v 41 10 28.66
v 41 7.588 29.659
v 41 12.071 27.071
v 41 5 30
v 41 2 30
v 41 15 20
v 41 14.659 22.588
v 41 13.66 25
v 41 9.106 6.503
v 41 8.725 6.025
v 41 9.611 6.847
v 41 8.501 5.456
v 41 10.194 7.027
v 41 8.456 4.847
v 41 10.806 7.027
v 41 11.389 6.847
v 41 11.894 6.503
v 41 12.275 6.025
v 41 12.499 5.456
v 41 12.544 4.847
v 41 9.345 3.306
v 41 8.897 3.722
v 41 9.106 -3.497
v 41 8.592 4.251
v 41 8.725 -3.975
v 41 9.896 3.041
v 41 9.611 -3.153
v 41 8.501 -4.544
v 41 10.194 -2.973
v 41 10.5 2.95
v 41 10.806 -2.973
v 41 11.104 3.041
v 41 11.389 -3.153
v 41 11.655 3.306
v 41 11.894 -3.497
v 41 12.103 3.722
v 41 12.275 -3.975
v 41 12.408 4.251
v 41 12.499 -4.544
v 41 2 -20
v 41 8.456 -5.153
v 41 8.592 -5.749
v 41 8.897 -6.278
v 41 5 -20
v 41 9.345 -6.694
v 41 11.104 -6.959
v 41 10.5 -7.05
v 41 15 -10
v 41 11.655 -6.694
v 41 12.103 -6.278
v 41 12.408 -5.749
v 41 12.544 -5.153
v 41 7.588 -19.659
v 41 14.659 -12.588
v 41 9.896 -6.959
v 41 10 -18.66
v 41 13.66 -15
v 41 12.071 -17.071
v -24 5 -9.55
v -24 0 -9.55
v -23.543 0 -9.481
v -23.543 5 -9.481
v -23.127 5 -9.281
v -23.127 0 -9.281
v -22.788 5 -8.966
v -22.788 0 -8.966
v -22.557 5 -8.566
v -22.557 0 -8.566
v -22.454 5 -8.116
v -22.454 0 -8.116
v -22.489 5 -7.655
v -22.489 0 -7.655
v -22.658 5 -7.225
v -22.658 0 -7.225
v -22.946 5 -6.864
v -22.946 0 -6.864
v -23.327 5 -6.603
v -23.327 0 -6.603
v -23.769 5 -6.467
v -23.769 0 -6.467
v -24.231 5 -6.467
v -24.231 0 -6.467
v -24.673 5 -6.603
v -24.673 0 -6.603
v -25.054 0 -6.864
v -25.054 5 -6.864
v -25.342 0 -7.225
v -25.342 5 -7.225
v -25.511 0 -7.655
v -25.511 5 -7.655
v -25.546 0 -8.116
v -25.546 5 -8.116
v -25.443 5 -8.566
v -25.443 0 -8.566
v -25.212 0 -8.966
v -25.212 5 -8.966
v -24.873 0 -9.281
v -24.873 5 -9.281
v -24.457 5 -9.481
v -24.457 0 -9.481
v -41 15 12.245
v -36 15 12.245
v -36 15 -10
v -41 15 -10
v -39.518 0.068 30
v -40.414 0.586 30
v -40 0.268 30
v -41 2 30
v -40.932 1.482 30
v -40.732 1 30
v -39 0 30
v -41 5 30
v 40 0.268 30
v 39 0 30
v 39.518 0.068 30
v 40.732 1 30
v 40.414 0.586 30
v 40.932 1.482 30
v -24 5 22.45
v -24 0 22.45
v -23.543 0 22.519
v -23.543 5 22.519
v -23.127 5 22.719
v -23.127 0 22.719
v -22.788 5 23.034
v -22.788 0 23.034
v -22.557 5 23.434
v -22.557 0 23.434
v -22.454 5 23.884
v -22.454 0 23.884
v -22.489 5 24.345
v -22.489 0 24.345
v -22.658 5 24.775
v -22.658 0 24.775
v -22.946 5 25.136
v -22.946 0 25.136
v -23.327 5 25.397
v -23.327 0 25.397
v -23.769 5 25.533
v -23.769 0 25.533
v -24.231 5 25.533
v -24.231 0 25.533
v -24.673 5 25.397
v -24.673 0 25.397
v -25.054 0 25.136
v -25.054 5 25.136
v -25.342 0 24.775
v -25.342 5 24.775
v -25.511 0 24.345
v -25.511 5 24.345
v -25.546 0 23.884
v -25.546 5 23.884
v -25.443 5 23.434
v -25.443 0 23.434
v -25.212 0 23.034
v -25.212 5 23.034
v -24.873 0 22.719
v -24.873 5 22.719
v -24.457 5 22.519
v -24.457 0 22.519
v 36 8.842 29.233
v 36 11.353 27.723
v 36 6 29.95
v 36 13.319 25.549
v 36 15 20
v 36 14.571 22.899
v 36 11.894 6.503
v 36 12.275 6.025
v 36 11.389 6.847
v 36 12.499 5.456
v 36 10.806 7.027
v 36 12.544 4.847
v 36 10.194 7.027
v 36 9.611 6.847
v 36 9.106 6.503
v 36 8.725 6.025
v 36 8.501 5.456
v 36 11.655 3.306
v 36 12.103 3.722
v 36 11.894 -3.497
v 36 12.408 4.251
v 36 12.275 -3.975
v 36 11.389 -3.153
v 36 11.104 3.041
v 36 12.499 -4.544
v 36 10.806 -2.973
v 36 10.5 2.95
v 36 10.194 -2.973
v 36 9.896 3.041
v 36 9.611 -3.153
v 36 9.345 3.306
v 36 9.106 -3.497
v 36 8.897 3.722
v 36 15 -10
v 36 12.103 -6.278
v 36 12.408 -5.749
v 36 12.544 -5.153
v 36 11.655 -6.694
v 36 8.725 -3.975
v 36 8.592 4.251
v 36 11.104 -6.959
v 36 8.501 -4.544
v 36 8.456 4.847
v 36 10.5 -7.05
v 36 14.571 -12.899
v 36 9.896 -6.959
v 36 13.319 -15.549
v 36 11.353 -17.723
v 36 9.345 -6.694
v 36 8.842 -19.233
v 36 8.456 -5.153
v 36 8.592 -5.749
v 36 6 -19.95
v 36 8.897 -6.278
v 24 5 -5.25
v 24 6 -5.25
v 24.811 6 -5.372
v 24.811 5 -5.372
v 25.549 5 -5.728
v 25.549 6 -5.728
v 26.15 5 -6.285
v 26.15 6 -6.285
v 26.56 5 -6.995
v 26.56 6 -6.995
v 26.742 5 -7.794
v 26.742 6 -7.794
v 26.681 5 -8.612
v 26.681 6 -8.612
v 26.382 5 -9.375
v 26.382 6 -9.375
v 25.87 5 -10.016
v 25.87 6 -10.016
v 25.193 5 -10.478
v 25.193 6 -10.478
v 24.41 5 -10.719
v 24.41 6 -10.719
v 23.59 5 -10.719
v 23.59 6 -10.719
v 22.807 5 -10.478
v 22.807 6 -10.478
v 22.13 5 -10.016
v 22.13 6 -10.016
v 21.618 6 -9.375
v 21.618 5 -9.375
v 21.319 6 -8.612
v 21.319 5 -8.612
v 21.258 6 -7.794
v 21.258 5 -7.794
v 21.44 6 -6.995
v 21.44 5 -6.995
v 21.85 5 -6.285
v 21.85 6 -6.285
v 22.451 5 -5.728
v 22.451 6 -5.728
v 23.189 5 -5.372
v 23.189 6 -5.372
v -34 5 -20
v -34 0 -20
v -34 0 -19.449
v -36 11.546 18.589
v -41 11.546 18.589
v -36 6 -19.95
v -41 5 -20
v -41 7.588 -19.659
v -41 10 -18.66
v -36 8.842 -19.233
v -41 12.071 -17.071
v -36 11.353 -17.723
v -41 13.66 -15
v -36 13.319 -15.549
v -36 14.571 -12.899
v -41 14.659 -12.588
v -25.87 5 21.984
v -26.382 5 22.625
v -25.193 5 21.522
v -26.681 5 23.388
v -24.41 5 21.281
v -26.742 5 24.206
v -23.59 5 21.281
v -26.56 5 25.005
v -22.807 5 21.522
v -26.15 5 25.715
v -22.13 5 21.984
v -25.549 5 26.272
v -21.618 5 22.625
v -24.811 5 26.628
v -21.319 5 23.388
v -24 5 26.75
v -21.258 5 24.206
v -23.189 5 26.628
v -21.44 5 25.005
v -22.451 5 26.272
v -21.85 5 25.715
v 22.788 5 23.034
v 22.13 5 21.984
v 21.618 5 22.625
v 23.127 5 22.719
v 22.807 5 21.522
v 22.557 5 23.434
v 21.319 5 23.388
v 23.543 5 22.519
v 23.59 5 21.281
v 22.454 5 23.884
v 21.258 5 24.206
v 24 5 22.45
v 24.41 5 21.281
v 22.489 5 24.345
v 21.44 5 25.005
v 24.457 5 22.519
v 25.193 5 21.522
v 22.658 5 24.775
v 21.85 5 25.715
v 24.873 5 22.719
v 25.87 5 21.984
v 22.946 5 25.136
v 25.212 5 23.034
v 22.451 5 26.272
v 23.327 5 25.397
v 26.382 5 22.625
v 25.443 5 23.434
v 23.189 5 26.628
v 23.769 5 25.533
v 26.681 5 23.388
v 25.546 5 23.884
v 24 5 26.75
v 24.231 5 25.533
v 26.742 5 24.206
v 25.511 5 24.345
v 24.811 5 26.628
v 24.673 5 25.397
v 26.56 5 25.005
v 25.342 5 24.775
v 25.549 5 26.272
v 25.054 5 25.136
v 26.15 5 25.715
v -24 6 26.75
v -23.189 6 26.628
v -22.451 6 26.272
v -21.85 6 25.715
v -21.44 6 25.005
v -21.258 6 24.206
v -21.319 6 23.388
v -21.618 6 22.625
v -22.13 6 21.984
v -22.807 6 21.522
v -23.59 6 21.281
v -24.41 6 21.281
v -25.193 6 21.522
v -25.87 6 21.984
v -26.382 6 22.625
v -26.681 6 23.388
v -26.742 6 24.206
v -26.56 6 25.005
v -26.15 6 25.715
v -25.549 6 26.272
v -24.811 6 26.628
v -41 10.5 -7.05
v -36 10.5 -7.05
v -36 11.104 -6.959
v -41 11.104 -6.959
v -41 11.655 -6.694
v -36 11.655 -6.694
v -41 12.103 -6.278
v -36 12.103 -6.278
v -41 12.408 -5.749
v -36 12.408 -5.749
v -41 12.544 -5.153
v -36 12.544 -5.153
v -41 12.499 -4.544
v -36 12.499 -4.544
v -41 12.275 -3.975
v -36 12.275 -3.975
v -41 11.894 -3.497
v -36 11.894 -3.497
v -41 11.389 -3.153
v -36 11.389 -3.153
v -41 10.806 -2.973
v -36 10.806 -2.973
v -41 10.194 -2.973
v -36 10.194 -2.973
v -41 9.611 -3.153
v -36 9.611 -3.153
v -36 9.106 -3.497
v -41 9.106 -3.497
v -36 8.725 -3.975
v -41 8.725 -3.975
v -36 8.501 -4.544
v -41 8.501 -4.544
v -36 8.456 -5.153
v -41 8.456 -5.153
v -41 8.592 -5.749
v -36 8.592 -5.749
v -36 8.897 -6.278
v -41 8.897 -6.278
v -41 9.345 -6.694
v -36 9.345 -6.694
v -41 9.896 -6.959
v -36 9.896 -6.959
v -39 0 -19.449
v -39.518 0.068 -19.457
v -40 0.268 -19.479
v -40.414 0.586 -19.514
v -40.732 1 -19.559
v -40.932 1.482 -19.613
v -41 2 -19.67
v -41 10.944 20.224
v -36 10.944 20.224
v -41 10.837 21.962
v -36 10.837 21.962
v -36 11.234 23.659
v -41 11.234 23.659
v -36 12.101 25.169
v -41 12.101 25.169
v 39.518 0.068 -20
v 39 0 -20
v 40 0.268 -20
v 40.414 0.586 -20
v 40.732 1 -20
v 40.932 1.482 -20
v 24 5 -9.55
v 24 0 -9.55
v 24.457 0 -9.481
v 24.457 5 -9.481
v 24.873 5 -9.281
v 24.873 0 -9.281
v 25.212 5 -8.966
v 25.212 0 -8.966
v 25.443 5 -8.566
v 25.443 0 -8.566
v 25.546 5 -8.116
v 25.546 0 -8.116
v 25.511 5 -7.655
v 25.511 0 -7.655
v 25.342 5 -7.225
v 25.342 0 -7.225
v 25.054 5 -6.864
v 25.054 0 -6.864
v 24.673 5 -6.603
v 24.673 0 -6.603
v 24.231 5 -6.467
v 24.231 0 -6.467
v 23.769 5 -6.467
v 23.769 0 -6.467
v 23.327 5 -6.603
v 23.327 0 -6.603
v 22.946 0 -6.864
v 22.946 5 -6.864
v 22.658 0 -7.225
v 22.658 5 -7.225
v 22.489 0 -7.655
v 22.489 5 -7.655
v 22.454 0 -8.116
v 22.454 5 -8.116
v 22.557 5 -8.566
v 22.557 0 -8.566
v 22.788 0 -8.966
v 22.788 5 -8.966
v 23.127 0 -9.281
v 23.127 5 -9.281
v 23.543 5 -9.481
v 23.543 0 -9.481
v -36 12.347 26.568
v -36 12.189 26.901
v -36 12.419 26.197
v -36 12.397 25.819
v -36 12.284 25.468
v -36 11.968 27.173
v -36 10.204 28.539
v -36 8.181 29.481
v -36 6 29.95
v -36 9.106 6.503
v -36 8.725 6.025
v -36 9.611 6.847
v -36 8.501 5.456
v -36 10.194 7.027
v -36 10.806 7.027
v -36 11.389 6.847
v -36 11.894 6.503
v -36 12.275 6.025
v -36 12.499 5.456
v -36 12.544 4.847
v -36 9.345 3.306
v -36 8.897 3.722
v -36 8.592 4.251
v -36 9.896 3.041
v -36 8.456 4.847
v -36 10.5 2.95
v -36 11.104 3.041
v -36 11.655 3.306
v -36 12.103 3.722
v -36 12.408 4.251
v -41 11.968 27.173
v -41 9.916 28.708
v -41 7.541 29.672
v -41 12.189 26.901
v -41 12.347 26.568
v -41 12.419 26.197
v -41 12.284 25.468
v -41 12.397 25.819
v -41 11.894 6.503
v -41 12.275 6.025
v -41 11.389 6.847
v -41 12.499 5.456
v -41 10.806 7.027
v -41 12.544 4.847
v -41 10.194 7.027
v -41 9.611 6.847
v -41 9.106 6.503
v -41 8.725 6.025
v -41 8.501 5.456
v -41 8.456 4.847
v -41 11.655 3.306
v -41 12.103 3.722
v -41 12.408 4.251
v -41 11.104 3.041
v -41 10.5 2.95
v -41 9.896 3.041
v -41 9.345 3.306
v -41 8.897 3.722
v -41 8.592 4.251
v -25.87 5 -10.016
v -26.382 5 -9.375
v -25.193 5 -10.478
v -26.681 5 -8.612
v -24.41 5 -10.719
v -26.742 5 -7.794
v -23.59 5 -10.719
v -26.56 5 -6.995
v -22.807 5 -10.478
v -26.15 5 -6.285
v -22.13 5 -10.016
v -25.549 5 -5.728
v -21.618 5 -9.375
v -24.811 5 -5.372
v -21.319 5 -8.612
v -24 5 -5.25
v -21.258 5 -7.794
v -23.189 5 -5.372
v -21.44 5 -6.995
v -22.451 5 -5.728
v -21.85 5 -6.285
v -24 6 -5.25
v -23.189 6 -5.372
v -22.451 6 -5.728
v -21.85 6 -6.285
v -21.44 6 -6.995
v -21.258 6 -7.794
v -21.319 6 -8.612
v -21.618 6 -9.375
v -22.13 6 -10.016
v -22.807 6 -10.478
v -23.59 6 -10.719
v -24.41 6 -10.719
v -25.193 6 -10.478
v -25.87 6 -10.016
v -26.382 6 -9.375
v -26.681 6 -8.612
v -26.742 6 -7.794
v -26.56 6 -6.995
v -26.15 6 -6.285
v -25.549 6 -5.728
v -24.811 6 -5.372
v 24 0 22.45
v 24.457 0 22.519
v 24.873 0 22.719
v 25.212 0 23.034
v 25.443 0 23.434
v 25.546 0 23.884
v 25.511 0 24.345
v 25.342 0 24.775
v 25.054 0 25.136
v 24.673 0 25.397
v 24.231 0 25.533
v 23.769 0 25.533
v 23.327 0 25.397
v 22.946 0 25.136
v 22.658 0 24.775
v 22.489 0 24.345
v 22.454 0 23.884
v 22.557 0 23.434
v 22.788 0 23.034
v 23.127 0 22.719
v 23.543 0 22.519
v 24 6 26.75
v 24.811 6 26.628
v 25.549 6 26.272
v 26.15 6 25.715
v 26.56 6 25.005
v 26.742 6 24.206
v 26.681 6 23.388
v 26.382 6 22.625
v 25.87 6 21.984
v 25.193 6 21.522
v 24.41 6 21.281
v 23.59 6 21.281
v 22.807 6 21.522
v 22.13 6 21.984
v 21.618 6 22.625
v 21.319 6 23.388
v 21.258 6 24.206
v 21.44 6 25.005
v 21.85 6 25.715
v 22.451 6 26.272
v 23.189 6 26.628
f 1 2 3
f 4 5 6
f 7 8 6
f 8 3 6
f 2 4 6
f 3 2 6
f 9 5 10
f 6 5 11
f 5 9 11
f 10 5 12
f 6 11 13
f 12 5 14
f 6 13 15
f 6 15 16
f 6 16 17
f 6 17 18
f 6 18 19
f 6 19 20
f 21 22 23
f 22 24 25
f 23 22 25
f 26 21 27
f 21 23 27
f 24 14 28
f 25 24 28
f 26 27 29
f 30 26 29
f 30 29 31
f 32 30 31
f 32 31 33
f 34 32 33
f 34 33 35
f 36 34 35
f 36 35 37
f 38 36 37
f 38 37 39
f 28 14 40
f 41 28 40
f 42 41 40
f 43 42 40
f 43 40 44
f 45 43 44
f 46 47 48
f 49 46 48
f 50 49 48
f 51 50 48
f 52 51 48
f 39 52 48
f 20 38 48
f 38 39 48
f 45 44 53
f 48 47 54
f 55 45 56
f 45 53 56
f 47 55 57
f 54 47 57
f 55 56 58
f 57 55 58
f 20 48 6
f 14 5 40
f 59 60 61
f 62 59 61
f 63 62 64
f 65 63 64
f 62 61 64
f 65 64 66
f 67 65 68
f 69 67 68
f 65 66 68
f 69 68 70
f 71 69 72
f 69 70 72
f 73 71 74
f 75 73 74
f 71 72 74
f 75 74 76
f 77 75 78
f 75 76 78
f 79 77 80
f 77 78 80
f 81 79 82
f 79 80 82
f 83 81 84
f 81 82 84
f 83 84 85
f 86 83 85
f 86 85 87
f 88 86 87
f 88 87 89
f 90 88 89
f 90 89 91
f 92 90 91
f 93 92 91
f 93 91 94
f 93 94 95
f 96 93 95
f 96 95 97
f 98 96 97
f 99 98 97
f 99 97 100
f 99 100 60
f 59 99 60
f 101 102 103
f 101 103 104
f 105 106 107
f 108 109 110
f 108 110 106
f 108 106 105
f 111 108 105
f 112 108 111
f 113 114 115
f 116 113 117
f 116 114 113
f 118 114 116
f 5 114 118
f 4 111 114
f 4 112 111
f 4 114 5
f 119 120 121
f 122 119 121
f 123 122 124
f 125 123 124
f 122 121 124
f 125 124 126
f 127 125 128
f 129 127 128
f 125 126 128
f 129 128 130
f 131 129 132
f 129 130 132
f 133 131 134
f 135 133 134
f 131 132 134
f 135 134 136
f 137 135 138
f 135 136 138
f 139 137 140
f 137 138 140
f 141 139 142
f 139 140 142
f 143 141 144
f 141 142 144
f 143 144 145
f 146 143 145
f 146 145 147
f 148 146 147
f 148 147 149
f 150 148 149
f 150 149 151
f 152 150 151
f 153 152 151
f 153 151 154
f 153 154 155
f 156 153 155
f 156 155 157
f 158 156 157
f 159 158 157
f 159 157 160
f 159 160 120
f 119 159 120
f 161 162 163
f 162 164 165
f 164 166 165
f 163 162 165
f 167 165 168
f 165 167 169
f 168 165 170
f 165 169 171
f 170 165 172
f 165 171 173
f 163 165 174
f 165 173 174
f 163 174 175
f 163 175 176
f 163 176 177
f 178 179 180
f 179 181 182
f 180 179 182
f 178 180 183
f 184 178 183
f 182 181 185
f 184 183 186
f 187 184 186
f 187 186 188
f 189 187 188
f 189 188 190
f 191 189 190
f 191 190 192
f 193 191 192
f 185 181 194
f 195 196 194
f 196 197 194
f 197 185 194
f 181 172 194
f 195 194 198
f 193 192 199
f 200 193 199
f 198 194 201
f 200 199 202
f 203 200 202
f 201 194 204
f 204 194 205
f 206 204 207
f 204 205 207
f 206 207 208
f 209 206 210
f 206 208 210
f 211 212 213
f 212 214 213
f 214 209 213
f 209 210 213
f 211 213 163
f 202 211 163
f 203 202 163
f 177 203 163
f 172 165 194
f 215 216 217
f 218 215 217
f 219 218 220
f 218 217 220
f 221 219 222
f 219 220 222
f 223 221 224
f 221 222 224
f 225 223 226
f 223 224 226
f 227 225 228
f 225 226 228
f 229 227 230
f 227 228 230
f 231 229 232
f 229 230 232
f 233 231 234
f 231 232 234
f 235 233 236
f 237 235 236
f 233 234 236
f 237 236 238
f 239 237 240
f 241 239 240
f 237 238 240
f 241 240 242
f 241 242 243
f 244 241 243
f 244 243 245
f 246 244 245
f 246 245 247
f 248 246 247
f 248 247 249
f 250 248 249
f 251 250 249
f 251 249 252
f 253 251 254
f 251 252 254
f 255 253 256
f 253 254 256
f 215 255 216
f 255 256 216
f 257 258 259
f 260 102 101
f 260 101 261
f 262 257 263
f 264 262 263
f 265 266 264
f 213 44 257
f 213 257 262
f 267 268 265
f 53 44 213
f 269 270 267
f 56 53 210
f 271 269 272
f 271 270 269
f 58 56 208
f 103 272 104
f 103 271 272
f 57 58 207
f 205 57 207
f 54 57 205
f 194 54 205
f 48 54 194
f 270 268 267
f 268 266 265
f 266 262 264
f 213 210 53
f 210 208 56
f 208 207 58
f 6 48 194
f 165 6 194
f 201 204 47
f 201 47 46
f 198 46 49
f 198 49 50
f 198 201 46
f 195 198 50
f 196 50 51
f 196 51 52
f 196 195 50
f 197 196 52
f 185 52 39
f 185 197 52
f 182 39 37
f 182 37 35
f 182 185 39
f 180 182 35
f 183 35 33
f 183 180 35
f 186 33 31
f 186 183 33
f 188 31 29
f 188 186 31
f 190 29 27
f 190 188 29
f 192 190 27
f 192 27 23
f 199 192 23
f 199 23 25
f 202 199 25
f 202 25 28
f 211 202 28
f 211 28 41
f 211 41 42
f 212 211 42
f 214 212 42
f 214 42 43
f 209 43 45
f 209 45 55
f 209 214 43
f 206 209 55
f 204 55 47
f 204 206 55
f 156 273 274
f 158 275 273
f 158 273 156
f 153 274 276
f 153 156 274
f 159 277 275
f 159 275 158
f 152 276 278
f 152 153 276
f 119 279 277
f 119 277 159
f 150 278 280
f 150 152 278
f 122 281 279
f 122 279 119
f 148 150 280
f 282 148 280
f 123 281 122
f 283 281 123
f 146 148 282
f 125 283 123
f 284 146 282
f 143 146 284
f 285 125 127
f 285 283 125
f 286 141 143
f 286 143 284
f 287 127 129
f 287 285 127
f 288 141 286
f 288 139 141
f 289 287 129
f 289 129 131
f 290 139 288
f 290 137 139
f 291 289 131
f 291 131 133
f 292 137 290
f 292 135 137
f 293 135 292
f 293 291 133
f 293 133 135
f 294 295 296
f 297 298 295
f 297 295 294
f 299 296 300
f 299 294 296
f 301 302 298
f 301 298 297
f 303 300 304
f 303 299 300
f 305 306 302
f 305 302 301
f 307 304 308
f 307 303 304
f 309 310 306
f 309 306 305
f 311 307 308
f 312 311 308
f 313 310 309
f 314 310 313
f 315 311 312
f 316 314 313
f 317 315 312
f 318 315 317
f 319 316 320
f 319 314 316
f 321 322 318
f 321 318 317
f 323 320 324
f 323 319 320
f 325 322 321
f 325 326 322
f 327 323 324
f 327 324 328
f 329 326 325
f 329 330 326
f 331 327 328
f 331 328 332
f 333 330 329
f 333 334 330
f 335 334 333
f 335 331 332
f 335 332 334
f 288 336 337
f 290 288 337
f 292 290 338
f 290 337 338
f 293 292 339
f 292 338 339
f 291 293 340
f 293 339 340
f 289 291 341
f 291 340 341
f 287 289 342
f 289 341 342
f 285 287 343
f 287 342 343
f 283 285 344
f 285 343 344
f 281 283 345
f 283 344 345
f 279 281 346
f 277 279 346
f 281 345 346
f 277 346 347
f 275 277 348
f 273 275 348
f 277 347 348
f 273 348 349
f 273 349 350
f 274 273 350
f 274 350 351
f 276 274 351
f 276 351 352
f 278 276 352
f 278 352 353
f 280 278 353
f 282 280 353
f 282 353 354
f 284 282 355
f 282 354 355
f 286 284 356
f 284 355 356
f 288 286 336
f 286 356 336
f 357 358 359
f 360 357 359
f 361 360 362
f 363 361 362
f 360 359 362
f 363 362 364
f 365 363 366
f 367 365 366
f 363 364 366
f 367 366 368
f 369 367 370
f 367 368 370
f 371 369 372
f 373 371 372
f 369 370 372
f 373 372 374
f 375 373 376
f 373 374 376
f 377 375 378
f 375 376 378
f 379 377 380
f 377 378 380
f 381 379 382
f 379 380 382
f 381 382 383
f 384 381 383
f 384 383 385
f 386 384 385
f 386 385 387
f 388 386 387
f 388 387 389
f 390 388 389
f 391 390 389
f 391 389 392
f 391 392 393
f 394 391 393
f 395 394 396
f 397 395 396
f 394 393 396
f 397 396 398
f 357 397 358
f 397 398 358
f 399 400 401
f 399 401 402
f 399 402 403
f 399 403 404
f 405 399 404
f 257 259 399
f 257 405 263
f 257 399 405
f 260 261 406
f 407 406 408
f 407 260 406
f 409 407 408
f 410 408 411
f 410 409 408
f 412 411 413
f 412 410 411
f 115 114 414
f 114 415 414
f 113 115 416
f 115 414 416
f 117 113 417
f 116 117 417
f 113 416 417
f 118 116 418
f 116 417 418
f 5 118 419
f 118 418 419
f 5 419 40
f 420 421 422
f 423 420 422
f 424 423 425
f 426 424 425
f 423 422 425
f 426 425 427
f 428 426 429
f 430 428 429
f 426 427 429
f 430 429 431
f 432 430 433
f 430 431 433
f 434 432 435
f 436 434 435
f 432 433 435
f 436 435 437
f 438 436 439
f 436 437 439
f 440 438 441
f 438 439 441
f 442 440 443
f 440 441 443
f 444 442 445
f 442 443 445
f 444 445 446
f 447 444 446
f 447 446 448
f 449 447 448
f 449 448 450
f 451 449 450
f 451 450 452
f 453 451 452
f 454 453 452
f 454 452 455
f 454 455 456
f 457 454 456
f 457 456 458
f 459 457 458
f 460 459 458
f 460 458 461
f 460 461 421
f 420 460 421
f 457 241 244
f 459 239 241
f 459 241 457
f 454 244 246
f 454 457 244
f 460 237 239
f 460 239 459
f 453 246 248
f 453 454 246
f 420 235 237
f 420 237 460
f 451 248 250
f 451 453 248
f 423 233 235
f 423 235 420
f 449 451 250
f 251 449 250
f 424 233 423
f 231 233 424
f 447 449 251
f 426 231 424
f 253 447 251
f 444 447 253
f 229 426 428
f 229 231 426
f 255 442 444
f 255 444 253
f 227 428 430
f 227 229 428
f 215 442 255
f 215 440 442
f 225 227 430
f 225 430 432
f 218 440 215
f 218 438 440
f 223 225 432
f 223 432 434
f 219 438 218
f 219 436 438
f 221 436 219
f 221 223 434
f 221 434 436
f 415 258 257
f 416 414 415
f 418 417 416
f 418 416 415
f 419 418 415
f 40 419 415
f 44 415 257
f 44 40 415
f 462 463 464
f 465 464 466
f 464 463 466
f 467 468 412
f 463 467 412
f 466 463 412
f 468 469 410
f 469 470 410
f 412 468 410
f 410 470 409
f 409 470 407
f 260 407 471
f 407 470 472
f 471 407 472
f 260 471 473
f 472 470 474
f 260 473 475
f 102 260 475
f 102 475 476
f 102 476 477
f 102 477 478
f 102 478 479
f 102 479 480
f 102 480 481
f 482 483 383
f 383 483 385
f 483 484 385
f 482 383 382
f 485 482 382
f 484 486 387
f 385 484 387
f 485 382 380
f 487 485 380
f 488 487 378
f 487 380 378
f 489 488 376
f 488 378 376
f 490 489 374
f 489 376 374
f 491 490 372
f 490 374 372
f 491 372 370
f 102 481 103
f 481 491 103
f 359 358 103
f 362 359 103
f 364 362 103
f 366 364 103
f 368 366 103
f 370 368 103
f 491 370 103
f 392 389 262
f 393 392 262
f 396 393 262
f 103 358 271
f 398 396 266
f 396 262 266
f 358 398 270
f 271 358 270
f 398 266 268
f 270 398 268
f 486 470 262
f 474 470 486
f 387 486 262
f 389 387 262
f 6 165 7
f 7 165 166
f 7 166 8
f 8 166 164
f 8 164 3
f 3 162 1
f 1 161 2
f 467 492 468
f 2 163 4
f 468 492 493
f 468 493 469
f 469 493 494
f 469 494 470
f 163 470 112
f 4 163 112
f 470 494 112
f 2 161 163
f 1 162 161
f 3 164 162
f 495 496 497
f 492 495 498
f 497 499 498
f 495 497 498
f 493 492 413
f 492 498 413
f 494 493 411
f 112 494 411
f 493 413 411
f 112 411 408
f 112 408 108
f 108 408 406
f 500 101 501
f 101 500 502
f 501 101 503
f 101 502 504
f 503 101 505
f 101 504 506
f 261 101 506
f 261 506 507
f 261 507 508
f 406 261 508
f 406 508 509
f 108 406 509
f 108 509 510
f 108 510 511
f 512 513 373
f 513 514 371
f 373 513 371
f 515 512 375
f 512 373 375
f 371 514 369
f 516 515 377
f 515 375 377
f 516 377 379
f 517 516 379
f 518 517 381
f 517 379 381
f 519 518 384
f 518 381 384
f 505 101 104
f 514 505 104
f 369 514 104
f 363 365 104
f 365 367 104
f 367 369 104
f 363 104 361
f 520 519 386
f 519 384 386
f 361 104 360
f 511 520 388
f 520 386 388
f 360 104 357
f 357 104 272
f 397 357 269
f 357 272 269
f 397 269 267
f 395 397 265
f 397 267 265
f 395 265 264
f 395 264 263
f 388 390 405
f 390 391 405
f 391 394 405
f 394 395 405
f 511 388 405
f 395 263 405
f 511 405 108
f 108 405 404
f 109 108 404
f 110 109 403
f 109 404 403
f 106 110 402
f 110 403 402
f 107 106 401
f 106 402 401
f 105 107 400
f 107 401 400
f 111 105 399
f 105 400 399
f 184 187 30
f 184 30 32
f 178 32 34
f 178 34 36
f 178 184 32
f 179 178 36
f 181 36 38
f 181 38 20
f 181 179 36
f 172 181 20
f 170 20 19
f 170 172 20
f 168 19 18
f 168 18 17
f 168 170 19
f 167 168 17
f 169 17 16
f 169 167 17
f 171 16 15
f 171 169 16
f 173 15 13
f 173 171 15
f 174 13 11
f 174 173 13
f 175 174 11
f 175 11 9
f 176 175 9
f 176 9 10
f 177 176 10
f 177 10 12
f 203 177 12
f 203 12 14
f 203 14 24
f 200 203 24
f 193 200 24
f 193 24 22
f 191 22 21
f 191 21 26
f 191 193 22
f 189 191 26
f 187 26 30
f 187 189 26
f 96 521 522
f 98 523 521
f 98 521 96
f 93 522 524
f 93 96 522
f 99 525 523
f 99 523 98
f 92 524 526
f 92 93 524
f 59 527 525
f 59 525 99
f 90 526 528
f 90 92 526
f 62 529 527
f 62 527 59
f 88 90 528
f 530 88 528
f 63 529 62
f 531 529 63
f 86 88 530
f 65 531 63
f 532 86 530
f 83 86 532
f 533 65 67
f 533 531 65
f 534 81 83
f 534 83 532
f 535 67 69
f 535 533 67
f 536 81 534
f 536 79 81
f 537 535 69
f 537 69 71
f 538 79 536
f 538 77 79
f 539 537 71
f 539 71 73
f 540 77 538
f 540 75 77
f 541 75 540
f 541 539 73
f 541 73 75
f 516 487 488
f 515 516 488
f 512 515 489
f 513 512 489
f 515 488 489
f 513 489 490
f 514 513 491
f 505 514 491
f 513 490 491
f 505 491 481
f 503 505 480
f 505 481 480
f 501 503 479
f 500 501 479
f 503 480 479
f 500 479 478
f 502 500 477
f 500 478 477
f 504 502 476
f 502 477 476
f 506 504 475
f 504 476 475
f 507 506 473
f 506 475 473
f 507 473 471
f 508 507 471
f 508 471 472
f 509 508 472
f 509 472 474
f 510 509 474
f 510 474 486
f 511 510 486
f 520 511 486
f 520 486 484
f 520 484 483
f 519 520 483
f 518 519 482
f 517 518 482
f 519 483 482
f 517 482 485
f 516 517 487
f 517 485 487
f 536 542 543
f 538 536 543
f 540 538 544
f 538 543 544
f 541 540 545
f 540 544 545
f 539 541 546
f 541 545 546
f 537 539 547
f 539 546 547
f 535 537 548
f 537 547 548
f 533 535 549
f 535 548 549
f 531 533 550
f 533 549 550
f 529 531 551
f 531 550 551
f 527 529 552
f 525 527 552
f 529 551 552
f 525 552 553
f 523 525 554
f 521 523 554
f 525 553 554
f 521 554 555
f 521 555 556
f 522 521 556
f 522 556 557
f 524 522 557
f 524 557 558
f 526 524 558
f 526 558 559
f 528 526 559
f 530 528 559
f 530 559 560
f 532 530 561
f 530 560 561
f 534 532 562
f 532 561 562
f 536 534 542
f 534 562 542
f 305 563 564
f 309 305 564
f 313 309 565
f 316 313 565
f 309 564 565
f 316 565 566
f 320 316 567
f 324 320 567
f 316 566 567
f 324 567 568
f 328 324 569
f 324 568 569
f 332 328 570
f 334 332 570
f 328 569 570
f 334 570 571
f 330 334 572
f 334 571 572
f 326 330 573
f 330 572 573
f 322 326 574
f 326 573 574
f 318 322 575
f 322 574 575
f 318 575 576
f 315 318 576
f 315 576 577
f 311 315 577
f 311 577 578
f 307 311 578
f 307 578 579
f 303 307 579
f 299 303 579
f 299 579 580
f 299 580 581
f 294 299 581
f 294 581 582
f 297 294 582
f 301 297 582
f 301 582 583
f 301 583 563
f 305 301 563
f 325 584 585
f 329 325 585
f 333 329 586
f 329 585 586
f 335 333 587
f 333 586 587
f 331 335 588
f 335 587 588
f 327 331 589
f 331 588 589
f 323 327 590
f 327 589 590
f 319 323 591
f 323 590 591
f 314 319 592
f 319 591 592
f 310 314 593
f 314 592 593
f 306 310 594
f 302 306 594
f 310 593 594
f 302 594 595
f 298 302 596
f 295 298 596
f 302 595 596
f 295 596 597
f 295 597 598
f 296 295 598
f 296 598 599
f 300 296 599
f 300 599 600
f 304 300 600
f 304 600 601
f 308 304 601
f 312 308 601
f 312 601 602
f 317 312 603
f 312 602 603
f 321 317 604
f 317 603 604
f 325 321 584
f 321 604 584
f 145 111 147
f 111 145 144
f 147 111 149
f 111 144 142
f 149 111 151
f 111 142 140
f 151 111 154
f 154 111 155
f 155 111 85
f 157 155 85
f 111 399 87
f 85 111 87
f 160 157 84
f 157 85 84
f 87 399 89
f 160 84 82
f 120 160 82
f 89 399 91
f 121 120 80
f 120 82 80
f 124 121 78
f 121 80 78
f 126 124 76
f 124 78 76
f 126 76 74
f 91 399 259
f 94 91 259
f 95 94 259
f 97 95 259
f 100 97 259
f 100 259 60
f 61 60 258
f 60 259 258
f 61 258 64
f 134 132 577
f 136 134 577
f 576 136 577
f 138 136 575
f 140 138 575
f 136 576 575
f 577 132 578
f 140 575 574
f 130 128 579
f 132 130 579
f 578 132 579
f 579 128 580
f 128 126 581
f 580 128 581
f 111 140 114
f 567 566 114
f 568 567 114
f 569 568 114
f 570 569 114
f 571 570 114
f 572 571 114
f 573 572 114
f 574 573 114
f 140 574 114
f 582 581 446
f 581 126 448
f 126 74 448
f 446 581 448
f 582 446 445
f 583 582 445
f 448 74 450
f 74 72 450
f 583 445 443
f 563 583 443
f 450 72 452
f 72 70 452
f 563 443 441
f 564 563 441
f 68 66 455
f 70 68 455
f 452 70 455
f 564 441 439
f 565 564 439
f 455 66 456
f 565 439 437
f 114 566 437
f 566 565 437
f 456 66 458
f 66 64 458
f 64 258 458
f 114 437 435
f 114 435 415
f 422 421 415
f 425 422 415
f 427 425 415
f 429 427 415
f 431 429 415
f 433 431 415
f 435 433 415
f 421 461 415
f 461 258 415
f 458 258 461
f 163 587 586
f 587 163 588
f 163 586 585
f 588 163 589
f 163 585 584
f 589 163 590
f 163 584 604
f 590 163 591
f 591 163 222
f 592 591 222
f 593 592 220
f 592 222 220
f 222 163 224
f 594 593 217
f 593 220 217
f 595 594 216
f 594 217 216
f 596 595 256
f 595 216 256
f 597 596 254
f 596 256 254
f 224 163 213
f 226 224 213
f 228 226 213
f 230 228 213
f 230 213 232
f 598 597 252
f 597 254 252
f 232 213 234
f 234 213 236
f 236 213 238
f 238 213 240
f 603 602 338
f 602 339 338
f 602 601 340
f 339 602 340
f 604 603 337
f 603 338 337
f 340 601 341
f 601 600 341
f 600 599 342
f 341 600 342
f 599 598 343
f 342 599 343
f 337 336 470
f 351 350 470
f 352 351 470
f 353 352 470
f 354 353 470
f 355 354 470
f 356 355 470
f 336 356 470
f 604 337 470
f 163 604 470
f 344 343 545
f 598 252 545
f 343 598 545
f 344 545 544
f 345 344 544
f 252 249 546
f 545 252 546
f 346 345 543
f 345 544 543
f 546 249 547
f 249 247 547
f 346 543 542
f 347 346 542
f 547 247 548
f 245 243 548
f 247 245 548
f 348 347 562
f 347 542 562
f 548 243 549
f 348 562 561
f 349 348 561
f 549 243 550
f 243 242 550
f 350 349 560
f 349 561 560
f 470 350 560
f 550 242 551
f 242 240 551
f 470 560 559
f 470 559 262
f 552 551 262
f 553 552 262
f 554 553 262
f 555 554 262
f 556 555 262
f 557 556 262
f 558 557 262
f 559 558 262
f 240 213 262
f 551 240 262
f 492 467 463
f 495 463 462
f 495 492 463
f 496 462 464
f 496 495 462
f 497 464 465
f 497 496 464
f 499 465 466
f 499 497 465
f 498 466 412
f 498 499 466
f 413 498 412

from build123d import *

# Parameters (mm, degrees)
SKETCH1_W           = 72
SKETCH1_H           = 40
BOSS_EXTRUDE1_DEPTH = 6
SKETCH3_W           = 40
SKETCH3_H           = 15
SKETCH3_R           = 2.05
BOSS_EXTRUDE2_DEPTH = 5
FILLET2_R           = 10
FILLET1_R           = 2
BOSS_EXTRUDE3_DEPTH = 10
SKETCH6_R           = 1.55
CUT_EXTRUDE2_DEPTH  = 10
SKETCH2_R           = 2.75
CUT_EXTRUDE1_DEPTH  = 1
FILLET3_R           = 10
CUT_EXTRUDE3_DEPTH  = 7
FILLET4_R           = 1.5


with BuildPart() as part:
    # Sketch1 → Boss-Extrude1 (new body)
    with BuildSketch(Plane(origin=(0, 0, 0), x_dir=(1, 0, 0), z_dir=(0, 1, 0))):
        Rectangle(SKETCH1_W, SKETCH1_H)
    extrude(amount=BOSS_EXTRUDE1_DEPTH)

    # Sketch3 → Boss-Extrude2 (add)
    with BuildSketch(Plane(origin=(36, 0, 0), x_dir=(0, 0, -1), z_dir=(1, 0, 0))):
        with Locations((0, 7.5)):
            Rectangle(SKETCH3_W, SKETCH3_H)
        with Locations((-5, 10.5)):
            Circle(SKETCH3_R, mode=Mode.SUBTRACT)
        with Locations((5, 10.5)):
            Circle(SKETCH3_R, mode=Mode.SUBTRACT)
    boss_extrude2 = extrude(amount=BOSS_EXTRUDE2_DEPTH)

    # Mirror1: Boss-Extrude2 across plane
    add(boss_extrude2.mirror(Plane.ZY))

    # Fillet2
    fillet2_edges = [part.edges().sort_by_distance(p)[0] for p in [
        (38.5, 15, -20),
    ]]
    fillet(fillet2_edges, radius=FILLET2_R)

    # Fillet1
    fillet1_edges = [part.edges().sort_by_distance(p)[0] for p in [
        (41, 0, 0),
        (-41, 0, 0),
    ]]
    fillet(fillet1_edges, radius=FILLET1_R)

    # Sketch5 → Boss-Extrude3 (add)
    with BuildSketch(Plane.XY.offset(20)):
        with BuildLine():
            Line((-41, 15), (-41, 2))
            ThreePointArc((-41, 2), (-40.414213562, 0.585786438), (-39, 0))
            Line((-39, 0), (39, 0))
            ThreePointArc((39, 0), (40.414213562, 0.585786438), (41, 2))
            Line((41, 2), (41, 15))
            Line((41, 15), (36, 15))
            Line((36, 15), (36, 6))
            Line((36, 6), (-36, 6))
            Line((-36, 6), (-36, 15))
            Line((-36, 15), (-41, 15))
        make_face()
    extrude(amount=BOSS_EXTRUDE3_DEPTH)

    # Sketch6 → Cut-Extrude2 (cut)
    with BuildSketch(Plane.XZ):
        with Locations((24, 24)):
            Circle(SKETCH6_R)
        with Locations((24, -8)):
            Circle(SKETCH6_R)
        with Locations((-24, 24)):
            Circle(SKETCH6_R)
        with Locations((-24, -8)):
            Circle(SKETCH6_R)
    extrude(amount=-CUT_EXTRUDE2_DEPTH, mode=Mode.SUBTRACT)

    # Sketch2 → Cut-Extrude1 (cut)
    with BuildSketch(Plane(origin=(0, 6, 0), x_dir=(1, 0, 0), z_dir=(0, 1, 0))):
        with Locations((-24, 8)):
            Circle(SKETCH2_R)
        with Locations((-24, -24)):
            Circle(SKETCH2_R)
        with Locations((24, -24)):
            Circle(SKETCH2_R)
        with Locations((24, 8)):
            Circle(SKETCH2_R)
    extrude(amount=-CUT_EXTRUDE1_DEPTH, mode=Mode.SUBTRACT)

    # Fillet3
    fillet3_edges = [part.edges().sort_by_distance(p)[0] for p in [
        (-38.5, 15, 30),
    ]]
    fillet(fillet3_edges, radius=FILLET3_R)

    # Sketch7 → Cut-Extrude3 (cut)
    with BuildSketch(Plane.ZY.offset(41)):
        with BuildLine():
            Line((12.245425122, 15), (18.589156814, 11.546259248))
            ThreePointArc((18.589156814, 11.546259248), (22.57380679, 10.92053449), (26.05426141, 12.959014938))
            ThreePointArc((26.05426141, 12.959014938), (23.194514879, 14.476026313), (20, 15))
            Line((20, 15), (12.245425122, 15))
        make_face()
        Polygon((-20, 5), (-20.731407815, 5), (-20.180729163, 0), (-19.449321347, 0), align=None)
    extrude(amount=-CUT_EXTRUDE3_DEPTH, mode=Mode.SUBTRACT)

    # Fillet4
    fillet4_edges = [part.edges().sort_by_distance(p)[0] for p in [
        (-38.5, 12.959014938, 26.05426141),
    ]]
    fillet(fillet4_edges, radius=FILLET4_R)


solid = part.part
